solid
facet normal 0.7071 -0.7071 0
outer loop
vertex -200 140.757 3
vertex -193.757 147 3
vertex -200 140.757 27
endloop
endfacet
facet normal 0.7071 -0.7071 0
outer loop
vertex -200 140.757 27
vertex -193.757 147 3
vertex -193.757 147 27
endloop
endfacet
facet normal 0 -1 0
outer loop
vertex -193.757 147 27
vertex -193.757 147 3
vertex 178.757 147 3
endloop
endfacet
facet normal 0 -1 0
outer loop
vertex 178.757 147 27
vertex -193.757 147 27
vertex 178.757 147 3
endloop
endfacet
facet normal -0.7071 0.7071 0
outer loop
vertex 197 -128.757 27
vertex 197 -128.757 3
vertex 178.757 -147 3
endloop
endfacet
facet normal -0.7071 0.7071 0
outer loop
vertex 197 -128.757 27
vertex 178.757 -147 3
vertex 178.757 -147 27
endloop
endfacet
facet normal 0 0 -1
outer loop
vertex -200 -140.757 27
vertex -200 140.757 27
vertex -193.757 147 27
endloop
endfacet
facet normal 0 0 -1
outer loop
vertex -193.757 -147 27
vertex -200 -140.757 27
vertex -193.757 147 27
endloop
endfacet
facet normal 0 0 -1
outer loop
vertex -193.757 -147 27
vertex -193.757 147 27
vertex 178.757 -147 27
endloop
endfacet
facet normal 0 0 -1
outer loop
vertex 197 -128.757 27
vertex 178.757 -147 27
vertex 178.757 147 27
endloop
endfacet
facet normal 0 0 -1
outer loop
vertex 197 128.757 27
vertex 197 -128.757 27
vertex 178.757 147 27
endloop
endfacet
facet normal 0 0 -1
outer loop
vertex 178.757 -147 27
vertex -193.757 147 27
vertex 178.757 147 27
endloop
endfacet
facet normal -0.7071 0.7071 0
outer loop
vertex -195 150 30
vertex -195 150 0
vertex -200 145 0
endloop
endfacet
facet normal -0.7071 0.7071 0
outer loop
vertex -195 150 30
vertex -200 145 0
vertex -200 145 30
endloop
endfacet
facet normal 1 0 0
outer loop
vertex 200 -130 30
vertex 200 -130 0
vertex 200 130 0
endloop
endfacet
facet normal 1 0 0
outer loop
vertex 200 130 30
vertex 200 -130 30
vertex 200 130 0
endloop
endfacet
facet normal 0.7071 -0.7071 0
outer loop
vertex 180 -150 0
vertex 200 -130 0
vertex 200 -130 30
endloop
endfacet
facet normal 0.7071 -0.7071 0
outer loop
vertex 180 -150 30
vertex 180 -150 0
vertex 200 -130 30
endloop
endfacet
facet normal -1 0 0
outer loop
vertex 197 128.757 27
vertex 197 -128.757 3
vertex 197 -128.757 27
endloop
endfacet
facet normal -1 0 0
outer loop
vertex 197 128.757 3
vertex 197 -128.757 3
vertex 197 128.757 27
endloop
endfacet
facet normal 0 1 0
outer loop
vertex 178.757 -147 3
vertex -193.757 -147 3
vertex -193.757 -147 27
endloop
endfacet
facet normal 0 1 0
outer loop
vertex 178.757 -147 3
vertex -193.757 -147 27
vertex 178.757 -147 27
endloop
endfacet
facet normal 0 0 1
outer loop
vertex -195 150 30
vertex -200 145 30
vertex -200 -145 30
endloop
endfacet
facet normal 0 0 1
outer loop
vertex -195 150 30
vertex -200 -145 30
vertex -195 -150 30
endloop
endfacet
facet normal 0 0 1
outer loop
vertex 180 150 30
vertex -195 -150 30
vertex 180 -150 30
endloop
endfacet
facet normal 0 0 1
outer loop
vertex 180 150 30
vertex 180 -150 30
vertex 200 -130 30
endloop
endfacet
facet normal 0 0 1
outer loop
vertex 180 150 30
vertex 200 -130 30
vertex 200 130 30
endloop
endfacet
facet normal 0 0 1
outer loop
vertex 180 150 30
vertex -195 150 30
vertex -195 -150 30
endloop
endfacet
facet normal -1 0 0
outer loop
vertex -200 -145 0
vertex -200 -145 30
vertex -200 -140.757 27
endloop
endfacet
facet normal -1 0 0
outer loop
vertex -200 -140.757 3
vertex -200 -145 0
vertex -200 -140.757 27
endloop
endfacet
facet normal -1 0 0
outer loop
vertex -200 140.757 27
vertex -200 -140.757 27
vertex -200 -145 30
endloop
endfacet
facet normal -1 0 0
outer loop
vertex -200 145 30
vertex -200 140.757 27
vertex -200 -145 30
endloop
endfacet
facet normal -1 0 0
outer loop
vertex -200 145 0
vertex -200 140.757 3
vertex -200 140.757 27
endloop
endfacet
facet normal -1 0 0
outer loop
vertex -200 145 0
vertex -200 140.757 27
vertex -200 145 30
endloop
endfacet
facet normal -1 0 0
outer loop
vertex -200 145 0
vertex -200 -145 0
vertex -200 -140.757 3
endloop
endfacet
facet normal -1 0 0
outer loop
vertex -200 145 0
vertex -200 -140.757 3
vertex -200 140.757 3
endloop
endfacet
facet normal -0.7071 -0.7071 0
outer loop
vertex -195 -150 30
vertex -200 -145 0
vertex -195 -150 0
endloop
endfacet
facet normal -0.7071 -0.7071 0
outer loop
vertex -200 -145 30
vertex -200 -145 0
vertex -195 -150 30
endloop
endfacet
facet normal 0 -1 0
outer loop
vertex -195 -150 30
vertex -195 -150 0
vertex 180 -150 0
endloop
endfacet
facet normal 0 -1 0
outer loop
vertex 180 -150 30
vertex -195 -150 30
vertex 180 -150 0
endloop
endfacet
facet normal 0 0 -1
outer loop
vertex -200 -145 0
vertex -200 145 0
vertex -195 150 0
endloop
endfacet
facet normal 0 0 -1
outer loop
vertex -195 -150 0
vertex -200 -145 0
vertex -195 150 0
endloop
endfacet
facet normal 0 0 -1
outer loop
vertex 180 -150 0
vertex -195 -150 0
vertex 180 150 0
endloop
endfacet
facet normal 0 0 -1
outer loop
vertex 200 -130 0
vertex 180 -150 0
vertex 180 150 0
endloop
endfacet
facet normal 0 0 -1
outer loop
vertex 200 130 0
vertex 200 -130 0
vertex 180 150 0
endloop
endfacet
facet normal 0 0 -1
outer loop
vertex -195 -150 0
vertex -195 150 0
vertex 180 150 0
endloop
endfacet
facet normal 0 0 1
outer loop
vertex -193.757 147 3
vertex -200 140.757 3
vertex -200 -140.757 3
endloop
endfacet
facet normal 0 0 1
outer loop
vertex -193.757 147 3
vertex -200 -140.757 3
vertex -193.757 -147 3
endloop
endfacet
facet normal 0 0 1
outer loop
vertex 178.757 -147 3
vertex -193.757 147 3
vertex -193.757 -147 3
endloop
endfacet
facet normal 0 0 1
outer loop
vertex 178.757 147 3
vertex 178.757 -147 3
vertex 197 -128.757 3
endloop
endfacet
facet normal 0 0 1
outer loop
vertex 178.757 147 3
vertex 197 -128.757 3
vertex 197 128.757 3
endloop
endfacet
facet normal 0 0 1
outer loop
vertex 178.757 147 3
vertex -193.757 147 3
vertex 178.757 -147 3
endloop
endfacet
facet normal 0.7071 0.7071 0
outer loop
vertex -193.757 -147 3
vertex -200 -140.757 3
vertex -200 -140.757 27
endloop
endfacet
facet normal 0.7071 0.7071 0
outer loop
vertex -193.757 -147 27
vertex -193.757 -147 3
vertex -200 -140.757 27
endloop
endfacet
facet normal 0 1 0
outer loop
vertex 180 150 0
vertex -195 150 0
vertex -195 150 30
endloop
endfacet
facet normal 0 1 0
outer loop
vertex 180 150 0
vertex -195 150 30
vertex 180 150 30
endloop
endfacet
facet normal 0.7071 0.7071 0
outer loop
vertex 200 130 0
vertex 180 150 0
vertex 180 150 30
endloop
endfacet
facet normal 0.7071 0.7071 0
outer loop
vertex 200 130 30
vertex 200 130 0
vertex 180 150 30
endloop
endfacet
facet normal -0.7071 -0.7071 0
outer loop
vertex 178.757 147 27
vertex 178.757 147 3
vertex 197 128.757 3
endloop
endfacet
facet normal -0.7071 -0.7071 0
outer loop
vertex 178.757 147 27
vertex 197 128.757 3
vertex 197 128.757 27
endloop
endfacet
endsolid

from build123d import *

# Parameters (mm, degrees)
F0_W     = 400
F0_H     = 300
F1_DEPTH = 30
F2_SIZE  = 20
F3_SIZE  = 5
F4_T     = -3


with BuildPart() as f1:
    # F0 (on Top) → F1 (new body)
    with BuildSketch(Plane.XY):
        Rectangle(F0_W, F0_H)
    extrude(amount=F1_DEPTH)

    # F2
    f2_edges = [f1.edges().sort_by_distance(p)[0] for p in [
        (200, -150, 15),
        (200, 150, 15),
    ]]
    chamfer(f2_edges, length=F2_SIZE)

    # F3
    f3_edges = [f1.edges().sort_by_distance(p)[0] for p in [
        (-200, -150, 15),
        (-200, 150, 15),
    ]]
    chamfer(f3_edges, length=F3_SIZE)

    # F4
    f4_openings = [f1.faces().sort_by_distance(p)[0] for p in [
        (-200, 0, 15),
    ]]
    offset(amount=F4_T, openings=f4_openings)


solid = f1.part
